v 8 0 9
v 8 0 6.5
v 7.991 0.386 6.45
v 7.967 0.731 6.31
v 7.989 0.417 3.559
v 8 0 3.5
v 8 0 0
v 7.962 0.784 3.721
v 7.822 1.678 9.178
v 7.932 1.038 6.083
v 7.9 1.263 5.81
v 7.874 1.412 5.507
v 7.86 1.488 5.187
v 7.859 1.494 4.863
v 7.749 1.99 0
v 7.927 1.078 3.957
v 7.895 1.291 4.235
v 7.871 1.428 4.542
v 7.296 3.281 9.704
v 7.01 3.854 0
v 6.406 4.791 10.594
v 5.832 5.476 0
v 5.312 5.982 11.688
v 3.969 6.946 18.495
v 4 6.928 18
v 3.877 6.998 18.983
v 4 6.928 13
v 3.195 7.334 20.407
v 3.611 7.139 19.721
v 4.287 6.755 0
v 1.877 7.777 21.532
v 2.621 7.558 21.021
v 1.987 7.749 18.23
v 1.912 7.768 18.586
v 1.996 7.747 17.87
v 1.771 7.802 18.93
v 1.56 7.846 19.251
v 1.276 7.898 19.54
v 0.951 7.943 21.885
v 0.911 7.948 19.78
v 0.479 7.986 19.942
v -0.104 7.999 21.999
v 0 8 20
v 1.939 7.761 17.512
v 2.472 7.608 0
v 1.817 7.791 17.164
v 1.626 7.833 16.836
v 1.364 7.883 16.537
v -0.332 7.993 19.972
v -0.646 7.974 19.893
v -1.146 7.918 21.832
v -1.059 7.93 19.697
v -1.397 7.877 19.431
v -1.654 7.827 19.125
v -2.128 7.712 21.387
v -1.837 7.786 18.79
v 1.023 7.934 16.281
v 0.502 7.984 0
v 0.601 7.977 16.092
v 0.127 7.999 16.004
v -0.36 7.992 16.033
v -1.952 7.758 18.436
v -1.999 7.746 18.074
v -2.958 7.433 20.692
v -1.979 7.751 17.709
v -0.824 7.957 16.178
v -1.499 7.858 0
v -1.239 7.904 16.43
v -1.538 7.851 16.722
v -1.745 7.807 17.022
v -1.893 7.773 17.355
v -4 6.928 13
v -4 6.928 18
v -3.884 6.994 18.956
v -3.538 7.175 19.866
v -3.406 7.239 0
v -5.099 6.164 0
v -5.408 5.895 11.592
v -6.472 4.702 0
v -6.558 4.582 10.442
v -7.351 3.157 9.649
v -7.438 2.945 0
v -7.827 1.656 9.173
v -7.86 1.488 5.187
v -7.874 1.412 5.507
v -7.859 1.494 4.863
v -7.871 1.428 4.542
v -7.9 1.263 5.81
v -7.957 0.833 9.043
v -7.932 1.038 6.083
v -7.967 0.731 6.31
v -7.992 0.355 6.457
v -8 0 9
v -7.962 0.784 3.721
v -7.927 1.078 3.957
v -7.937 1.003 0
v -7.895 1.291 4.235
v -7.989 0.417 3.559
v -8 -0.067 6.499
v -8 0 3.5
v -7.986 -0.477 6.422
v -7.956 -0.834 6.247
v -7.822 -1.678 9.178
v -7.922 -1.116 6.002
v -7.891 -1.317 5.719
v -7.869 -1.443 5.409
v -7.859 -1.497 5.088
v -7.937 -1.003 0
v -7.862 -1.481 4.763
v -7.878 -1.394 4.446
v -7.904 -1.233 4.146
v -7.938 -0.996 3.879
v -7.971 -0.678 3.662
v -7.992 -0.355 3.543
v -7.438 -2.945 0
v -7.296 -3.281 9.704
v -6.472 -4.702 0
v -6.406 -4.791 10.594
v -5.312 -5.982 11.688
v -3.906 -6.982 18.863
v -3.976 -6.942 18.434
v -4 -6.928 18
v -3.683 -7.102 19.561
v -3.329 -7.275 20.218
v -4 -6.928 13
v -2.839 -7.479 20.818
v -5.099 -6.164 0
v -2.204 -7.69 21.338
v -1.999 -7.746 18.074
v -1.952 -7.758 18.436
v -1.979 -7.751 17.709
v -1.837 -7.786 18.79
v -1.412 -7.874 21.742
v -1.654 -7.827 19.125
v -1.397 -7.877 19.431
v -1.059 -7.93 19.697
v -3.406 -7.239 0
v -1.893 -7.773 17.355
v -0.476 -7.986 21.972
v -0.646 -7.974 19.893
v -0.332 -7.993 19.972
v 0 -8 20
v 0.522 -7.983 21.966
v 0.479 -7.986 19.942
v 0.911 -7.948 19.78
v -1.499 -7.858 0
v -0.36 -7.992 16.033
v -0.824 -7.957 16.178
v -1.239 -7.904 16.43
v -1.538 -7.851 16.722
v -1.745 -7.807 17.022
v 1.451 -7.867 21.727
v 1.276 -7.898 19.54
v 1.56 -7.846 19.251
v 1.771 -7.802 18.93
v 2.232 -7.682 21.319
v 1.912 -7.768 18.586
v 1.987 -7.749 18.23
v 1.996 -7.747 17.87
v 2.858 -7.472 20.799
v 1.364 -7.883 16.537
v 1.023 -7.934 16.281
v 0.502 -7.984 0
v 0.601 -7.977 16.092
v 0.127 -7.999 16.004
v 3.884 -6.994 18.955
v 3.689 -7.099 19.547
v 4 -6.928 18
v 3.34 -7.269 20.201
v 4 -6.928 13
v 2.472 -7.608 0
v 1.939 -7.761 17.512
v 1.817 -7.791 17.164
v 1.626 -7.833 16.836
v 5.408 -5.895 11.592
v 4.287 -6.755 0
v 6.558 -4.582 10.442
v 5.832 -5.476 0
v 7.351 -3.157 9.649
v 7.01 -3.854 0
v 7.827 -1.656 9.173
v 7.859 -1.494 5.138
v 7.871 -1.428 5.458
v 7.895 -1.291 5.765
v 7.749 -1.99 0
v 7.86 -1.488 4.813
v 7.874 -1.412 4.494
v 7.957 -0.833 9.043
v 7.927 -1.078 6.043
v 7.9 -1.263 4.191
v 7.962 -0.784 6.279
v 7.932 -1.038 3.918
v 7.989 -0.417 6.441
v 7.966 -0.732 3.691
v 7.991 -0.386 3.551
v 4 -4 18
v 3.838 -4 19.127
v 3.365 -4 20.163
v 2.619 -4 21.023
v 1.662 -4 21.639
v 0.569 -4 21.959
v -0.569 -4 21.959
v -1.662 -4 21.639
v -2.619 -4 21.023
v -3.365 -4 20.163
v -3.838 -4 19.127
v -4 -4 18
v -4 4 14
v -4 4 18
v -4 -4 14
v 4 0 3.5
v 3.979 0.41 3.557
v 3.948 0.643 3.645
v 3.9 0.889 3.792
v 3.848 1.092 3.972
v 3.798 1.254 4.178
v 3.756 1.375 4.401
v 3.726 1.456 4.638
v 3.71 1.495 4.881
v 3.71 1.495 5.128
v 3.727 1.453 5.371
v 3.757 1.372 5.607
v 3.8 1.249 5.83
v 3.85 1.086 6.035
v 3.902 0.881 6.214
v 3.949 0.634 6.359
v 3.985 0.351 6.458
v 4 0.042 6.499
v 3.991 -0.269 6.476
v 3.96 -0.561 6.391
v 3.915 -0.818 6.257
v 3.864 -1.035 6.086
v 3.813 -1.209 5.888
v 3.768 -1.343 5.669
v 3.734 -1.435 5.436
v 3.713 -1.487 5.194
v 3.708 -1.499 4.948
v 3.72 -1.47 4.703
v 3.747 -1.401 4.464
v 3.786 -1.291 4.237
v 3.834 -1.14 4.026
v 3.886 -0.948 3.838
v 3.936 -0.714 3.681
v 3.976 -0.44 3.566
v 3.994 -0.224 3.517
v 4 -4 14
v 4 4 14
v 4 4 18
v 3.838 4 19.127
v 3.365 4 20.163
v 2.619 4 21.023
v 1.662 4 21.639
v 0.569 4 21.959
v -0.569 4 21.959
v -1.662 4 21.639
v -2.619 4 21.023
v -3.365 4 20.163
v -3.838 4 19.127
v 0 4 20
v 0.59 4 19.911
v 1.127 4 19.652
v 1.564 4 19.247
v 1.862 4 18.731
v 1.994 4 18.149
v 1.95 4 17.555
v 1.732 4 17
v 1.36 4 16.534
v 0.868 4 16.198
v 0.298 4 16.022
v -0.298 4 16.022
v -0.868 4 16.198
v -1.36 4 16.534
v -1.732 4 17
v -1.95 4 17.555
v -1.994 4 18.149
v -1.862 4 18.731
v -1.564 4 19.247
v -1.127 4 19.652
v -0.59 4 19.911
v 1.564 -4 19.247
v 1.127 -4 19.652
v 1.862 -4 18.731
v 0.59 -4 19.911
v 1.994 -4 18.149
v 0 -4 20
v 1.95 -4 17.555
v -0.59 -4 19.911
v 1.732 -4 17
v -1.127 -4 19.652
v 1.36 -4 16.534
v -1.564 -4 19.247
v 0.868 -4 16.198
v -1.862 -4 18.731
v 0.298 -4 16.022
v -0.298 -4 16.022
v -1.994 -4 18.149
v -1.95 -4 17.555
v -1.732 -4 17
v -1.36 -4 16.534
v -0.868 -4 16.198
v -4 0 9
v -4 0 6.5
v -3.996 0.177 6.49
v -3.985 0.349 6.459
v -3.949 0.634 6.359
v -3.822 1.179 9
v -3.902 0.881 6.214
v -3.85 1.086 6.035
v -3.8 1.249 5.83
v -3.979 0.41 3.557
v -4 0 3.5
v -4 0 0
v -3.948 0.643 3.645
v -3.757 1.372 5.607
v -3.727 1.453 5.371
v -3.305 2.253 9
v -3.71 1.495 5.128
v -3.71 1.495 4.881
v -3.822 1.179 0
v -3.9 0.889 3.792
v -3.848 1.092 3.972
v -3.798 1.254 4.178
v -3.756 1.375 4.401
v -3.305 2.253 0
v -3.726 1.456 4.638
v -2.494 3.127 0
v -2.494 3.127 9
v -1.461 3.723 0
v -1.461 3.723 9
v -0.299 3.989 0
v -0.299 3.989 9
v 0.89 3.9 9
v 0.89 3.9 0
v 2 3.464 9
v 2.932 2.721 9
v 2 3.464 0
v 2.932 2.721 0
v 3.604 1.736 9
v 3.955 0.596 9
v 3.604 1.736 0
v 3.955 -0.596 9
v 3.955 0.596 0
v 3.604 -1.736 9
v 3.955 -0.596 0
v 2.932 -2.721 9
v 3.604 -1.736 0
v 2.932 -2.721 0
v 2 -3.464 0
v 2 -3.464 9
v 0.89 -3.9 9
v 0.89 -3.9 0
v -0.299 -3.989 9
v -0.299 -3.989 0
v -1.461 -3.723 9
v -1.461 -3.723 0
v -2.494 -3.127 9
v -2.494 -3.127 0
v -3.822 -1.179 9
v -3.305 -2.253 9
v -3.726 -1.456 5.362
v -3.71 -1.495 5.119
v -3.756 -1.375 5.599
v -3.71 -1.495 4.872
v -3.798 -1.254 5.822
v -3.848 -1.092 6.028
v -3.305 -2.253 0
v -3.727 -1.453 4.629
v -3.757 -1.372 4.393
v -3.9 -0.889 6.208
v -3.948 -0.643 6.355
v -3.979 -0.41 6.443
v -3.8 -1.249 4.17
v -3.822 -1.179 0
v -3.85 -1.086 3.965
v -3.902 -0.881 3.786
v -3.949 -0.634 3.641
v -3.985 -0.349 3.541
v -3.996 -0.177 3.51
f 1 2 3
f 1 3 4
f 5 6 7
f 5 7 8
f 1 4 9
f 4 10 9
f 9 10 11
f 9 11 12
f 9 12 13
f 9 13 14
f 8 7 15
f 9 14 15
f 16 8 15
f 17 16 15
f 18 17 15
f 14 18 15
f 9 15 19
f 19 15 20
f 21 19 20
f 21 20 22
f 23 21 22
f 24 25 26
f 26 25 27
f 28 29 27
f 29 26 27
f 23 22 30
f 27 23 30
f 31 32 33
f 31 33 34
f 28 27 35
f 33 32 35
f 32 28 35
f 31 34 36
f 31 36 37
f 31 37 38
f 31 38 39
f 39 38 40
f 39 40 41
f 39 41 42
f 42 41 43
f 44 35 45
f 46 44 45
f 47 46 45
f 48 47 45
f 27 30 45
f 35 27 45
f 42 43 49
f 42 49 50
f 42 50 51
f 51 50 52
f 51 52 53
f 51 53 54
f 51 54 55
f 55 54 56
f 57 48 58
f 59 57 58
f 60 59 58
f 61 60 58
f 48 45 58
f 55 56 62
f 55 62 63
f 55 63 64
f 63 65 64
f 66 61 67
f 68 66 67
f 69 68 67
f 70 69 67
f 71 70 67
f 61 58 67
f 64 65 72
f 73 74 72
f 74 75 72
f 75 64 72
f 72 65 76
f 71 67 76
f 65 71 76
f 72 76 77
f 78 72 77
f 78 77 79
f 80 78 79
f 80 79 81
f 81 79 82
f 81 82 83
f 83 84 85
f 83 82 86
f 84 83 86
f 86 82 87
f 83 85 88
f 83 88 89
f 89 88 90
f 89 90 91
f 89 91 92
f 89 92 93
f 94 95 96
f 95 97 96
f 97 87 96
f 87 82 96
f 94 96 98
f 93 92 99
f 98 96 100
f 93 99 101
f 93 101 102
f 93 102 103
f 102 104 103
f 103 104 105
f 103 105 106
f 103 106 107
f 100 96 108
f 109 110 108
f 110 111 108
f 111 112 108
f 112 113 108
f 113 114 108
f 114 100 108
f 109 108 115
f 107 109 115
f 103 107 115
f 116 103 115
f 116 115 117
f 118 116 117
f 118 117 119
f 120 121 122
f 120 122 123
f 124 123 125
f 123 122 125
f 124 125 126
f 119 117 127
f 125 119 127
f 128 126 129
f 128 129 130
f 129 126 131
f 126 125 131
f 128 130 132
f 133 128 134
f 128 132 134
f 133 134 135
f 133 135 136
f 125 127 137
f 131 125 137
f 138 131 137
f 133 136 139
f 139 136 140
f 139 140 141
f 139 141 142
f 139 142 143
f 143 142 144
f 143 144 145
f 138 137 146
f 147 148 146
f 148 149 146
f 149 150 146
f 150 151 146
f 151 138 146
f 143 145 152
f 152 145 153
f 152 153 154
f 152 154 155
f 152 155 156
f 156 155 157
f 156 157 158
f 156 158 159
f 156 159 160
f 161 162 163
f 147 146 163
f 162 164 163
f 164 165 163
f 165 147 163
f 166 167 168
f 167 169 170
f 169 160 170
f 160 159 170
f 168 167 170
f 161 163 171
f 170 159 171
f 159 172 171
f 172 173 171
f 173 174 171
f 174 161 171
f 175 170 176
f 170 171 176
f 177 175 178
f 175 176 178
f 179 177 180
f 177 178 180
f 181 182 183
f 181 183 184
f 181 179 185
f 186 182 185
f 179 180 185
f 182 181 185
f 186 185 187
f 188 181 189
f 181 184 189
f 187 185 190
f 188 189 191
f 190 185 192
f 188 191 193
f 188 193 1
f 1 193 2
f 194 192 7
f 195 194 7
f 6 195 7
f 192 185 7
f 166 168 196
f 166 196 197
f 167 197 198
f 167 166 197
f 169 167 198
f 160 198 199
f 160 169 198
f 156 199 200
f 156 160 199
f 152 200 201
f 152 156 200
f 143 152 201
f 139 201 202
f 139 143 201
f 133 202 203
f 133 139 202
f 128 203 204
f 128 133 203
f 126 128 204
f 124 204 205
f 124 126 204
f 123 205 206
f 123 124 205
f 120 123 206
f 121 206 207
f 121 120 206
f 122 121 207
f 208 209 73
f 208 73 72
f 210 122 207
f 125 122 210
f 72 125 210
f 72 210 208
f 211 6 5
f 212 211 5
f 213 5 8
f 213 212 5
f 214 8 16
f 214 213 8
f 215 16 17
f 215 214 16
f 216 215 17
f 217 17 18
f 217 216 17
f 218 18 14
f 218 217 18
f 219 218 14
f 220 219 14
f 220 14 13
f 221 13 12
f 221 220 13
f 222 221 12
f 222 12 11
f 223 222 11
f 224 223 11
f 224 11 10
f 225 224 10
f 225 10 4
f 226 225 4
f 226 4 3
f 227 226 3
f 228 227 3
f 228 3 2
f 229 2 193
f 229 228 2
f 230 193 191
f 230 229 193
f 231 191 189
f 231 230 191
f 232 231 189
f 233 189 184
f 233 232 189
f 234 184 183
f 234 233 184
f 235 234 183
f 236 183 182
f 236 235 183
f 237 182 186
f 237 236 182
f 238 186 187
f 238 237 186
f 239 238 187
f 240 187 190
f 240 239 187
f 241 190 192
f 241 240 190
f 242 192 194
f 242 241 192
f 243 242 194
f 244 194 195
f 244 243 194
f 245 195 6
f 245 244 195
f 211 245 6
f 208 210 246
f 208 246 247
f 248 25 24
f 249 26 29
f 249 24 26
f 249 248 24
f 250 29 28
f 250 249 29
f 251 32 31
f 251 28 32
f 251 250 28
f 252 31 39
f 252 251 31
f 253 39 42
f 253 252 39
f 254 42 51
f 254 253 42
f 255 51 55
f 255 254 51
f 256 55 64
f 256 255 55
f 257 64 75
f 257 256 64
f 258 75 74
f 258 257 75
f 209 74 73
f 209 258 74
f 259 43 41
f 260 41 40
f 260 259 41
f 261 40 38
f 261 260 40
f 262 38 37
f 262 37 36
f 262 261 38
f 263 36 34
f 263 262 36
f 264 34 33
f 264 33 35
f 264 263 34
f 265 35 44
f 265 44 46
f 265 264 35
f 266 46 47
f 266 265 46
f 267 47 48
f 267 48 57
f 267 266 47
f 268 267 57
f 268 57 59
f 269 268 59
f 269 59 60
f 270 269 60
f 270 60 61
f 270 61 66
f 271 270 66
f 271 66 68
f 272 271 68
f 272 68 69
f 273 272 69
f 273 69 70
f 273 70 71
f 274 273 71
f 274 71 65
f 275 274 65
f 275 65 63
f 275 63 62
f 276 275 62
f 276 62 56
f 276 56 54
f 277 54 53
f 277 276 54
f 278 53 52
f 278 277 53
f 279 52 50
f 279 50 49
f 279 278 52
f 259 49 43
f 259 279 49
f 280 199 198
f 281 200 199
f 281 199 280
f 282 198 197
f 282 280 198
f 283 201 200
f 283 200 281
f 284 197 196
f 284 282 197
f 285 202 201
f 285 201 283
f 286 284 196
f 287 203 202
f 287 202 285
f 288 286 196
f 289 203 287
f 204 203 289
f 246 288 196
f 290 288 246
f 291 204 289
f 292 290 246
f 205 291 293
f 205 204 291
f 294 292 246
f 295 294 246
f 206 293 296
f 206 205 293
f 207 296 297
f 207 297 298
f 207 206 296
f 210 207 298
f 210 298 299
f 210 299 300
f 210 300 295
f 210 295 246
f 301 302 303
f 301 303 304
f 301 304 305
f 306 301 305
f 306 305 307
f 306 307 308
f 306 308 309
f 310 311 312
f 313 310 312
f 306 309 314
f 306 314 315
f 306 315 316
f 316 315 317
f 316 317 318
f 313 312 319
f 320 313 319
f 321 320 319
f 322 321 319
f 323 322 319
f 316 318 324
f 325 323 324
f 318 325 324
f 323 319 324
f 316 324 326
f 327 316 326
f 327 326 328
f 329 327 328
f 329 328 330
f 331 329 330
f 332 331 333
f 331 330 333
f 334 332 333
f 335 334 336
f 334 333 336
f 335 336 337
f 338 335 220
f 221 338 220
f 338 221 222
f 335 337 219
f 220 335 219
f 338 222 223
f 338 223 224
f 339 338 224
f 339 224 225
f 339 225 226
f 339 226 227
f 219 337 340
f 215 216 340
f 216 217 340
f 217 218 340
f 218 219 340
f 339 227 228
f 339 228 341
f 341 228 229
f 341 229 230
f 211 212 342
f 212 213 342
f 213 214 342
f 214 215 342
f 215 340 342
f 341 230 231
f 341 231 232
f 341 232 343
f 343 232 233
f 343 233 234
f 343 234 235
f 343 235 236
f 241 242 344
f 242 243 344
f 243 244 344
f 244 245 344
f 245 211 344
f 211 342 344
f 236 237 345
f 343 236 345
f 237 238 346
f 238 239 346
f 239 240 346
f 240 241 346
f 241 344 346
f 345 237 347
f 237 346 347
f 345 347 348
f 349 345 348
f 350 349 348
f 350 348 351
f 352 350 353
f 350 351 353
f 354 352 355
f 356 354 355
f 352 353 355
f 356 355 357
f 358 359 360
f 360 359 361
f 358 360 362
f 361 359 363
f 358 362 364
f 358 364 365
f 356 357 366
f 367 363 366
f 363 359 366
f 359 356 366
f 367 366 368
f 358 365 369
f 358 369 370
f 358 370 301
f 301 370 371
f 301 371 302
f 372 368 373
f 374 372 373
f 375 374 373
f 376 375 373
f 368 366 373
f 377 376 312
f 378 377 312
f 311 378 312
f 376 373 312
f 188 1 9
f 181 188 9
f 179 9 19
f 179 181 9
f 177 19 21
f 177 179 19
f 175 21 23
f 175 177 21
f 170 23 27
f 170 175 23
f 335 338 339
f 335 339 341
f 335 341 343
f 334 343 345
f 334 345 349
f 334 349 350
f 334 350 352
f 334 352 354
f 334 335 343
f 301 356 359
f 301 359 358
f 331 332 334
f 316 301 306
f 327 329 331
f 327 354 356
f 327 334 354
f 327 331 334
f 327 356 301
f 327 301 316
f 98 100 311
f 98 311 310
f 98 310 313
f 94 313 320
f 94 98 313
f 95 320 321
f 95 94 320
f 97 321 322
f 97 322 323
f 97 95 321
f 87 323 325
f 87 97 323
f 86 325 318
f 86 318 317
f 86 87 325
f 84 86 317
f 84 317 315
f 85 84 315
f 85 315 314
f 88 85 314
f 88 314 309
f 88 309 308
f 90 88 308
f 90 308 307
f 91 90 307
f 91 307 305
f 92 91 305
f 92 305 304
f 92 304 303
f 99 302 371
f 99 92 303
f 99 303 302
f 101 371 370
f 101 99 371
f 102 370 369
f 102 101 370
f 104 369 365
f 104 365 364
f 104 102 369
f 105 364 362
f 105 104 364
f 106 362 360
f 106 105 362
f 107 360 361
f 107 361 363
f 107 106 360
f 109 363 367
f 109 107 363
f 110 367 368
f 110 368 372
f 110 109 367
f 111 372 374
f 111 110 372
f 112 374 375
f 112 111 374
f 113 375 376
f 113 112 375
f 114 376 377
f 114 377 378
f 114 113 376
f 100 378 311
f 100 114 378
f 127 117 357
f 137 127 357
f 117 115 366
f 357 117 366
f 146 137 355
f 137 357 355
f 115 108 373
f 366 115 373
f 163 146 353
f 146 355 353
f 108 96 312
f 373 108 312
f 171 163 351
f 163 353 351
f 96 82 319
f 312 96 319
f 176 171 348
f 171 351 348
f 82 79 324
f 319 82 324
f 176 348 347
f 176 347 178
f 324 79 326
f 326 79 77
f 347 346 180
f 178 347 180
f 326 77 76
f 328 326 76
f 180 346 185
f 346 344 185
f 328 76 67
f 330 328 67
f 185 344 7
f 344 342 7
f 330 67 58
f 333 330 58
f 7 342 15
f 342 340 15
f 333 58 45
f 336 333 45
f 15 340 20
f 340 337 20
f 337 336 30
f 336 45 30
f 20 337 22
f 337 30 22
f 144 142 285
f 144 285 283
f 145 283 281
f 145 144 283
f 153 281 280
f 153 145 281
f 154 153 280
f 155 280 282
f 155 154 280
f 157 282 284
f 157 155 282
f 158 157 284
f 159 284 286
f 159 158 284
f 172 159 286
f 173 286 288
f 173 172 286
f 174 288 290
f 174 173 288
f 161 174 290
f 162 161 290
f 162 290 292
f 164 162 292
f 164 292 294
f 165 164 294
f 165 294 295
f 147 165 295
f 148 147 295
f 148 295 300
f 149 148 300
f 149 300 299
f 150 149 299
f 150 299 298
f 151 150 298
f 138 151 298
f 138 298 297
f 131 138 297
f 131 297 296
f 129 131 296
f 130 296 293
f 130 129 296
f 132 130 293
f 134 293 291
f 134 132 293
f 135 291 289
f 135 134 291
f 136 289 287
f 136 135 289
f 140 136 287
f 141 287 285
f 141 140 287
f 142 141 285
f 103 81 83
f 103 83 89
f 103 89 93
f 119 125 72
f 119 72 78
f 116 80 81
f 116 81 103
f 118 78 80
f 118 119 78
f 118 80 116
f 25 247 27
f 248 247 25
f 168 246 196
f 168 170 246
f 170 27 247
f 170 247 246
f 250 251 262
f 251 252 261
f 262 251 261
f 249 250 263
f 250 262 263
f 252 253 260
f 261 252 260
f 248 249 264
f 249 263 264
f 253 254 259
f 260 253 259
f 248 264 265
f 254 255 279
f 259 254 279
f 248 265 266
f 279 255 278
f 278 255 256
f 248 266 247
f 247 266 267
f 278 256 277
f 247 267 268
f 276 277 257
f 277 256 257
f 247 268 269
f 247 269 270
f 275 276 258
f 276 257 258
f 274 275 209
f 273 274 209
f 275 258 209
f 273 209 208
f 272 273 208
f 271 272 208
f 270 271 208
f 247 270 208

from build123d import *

# Parameters (mm, degrees)
SKETCH_1_R               = 8
EXTRUDE_1_DEPTH          = 22
CUT_EXTRUDE_1_DEPTH      = 25.738633754
CUT_EXTRUDE_1_DEPTH_BACK = 25.738633754
CUT_EXTRUDE_2_DEPTH      = 26
CUT_EXTRUDE_2_DEPTH_BACK = 26
SKETCH_3_R               = 2
CUT_EXTRUDE_3_DEPTH      = 26
CUT_EXTRUDE_3_DEPTH_BACK = 26
SKETCH_4_W               = 8
SKETCH_4_H               = 8
SKETCH_5_R               = 4
CUT_EXTRUDE_4_DEPTH      = 9
CUT_EXTRUDE_5_DEPTH      = 25.738633908
CUT_EXTRUDE_5_DEPTH_BACK = 25.738633908
SKETCH_6_R               = 1.5


with BuildPart() as part:
    # 草图1 → 拉伸1 (new body)
    with BuildSketch(Plane.XY):
        Circle(SKETCH_1_R)
    extrude(amount=EXTRUDE_1_DEPTH)

    # 草图2 → 切除-拉伸1 (cut, two sides: drawn at the far end of the back side and taken through both)
    with BuildSketch(Plane(origin=(0, 0, 0), x_dir=(1, 0, 0), z_dir=(0, 1, 0)).offset(-CUT_EXTRUDE_1_DEPTH_BACK)):
        with BuildLine():
            Line((8, -9), (4, -13))
            Line((4, -13), (4, -18))
            ThreePointArc((4, -18), (0, -22), (-4, -18))
            Line((-4, -18), (-4, -13))
            Line((-4, -13), (-8, -9))
            Line((-8, -9), (-8, -22))
            Line((-8, -22), (1.483160763, -24.700219192))
            Line((1.483160763, -24.700219192), (8, -22))
            Line((8, -22), (8, -9))
        make_face()
    extrude(amount=CUT_EXTRUDE_1_DEPTH + CUT_EXTRUDE_1_DEPTH_BACK, mode=Mode.SUBTRACT)

    # 草图3 → 切除-拉伸2 (cut, two sides: drawn at the far end of the back side and taken through both)
    with BuildSketch(Plane(origin=(0, 0, 0), x_dir=(1, 0, 0), z_dir=(0, 1, 0)).offset(-CUT_EXTRUDE_2_DEPTH_BACK)):
        with Locations((0, -18)):
            Circle(SKETCH_3_R)
    extrude(amount=CUT_EXTRUDE_2_DEPTH + CUT_EXTRUDE_2_DEPTH_BACK, mode=Mode.SUBTRACT)

    # 草图4 → 切除-拉伸3 (cut, two sides: drawn at the far end of the back side and taken through both)
    with BuildSketch(Plane(origin=(0, 0, 0), x_dir=(0, 0, -1), z_dir=(1, 0, 0)).offset(-CUT_EXTRUDE_3_DEPTH_BACK)):
        with Locations((-18, 0)):
            Rectangle(SKETCH_4_W, SKETCH_4_H)
    extrude(amount=CUT_EXTRUDE_3_DEPTH + CUT_EXTRUDE_3_DEPTH_BACK, mode=Mode.SUBTRACT)

    # 草图5 → 切除-拉伸4 (cut)
    with BuildSketch(Plane(origin=(0, 0, 0), x_dir=(-1, 0, 0), z_dir=(0, 0, -1))):
        Circle(SKETCH_5_R)
    extrude(amount=-CUT_EXTRUDE_4_DEPTH, mode=Mode.SUBTRACT)

    # 草图6 → 切除-拉伸5 (cut, two sides: drawn at the far end of the back side and taken through both)
    with BuildSketch(Plane(origin=(0, 0, 0), x_dir=(0, 0, -1), z_dir=(1, 0, 0)).offset(-CUT_EXTRUDE_5_DEPTH_BACK)):
        with Locations((-5, 0)):
            Circle(SKETCH_6_R)
    extrude(amount=CUT_EXTRUDE_5_DEPTH + CUT_EXTRUDE_5_DEPTH_BACK, mode=Mode.SUBTRACT)


solid = part.part
